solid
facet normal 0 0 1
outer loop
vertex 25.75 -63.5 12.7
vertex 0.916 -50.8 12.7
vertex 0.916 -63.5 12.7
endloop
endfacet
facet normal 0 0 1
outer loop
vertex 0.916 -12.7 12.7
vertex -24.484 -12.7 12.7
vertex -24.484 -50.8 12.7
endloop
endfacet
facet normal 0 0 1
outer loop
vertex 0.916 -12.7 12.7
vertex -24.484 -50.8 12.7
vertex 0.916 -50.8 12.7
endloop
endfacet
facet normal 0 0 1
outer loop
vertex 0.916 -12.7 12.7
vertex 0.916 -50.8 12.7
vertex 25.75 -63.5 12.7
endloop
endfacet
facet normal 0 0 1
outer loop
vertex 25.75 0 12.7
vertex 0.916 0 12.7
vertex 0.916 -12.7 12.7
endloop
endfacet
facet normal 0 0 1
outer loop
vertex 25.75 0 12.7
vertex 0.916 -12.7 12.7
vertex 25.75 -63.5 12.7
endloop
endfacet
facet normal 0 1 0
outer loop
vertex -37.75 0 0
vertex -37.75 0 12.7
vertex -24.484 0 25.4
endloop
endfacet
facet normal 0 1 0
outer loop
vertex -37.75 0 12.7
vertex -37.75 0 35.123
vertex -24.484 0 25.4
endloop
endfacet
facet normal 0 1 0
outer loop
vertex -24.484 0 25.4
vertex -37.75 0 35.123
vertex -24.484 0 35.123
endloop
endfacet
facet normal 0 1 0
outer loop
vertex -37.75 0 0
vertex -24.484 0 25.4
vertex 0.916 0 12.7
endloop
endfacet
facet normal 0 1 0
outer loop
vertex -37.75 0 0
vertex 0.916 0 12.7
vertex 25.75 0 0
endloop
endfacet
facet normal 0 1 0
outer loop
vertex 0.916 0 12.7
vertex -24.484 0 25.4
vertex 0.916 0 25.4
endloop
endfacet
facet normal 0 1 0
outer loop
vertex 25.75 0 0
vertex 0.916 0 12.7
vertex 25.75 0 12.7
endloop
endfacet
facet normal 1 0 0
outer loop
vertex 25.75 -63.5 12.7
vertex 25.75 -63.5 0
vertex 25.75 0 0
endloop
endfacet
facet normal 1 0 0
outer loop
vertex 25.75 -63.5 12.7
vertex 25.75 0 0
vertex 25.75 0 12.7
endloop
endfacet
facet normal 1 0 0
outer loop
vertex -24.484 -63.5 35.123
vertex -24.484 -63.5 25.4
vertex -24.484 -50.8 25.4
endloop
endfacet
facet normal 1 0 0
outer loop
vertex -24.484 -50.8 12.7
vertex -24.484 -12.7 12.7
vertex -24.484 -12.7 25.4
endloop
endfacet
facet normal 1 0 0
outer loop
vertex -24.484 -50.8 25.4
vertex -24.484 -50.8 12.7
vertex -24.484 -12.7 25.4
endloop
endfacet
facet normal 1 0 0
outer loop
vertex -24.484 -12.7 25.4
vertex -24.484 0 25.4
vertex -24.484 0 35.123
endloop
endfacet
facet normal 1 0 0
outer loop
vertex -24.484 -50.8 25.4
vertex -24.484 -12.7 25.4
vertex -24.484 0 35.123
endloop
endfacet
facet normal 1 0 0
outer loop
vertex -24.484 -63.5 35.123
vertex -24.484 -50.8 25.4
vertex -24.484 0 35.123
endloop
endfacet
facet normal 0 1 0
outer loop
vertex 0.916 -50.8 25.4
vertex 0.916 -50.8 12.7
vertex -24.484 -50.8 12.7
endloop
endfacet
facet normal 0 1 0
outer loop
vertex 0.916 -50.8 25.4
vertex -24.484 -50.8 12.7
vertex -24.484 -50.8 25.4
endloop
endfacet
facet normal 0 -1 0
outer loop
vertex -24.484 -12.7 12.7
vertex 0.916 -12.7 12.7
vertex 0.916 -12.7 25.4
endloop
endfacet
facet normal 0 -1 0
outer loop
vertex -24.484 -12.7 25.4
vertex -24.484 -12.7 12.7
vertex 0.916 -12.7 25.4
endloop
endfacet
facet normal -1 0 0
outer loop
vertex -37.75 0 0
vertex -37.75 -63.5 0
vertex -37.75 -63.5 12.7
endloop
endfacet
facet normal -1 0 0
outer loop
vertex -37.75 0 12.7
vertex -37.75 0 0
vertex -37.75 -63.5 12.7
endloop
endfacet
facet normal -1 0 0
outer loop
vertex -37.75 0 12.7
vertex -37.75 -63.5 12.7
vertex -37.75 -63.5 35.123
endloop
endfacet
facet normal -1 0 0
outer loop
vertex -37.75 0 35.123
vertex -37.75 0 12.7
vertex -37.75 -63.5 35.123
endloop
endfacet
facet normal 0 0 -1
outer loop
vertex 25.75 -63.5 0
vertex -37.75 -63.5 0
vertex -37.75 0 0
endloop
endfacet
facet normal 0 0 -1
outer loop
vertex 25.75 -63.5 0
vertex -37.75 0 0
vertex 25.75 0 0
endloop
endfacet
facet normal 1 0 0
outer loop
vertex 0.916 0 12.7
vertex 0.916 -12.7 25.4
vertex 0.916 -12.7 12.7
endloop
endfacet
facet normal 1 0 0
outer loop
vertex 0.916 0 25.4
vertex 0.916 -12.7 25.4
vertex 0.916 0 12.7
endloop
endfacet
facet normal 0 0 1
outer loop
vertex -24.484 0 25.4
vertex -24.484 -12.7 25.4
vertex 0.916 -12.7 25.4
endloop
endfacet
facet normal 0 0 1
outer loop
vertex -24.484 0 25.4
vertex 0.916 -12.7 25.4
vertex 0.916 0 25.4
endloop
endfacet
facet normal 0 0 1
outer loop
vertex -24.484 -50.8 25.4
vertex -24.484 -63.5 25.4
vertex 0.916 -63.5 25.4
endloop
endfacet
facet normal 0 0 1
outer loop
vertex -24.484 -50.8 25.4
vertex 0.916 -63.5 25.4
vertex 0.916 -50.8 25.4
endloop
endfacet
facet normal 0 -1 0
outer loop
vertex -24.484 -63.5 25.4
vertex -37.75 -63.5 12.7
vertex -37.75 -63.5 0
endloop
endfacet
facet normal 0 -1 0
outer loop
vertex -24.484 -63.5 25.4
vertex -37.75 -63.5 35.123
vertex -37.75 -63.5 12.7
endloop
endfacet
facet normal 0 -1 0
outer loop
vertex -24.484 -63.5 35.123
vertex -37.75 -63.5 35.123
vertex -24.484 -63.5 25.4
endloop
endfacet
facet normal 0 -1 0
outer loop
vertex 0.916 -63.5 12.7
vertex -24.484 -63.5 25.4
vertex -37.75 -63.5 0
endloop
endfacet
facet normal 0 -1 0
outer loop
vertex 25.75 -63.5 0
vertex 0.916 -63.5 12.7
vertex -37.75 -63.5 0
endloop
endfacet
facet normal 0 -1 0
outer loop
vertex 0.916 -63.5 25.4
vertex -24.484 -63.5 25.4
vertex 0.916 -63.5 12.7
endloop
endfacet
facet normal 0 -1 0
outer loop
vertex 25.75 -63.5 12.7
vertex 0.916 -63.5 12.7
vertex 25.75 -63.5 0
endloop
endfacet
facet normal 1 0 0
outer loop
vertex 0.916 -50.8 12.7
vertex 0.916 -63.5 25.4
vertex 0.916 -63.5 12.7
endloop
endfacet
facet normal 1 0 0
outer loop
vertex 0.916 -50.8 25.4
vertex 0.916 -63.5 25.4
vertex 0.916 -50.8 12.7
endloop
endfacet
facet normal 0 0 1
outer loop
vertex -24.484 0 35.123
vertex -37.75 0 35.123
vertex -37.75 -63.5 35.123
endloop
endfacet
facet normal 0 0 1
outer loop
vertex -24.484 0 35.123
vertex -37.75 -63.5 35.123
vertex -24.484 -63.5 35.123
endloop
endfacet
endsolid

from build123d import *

# Parameters (mm, degrees)
F0_W     = 63.5
F0_H     = 12.7
F1_DEPTH = 63.5
F2_W     = 13.266523
F2_H     = 22.422786
F3_DEPTH = 63.5
F4_W     = 12.7
F4_H     = 12.7
F5_DEPTH = 25.4
F6_W     = 12.7
F6_H     = 12.7
F7_DEPTH = 25.4


with BuildPart() as f1:
    # F0 (on Front) → F1 (new body)
    with BuildSketch(Plane.XZ):
        with Locations((-6.000457, 6.35)):
            Rectangle(F0_W, F0_H)
    extrude(amount=F1_DEPTH)

    # F2 (on Front) → F3 (join)
    with BuildSketch(Plane.XZ):
        with Locations((-31.117195, 23.911393)):
            Rectangle(F2_W, F2_H)
    extrude(amount=F3_DEPTH)

    # F4 (on face) → F5 (join)
    with BuildSketch(Plane.YZ.offset(-24.483934)):
        with Locations((-57.15, 19.05)):
            Rectangle(F4_W, F4_H)
    extrude(amount=F5_DEPTH)

    # F6 (on face) → F7 (join)
    with BuildSketch(Plane.YZ.offset(-24.483934)):
        with Locations((-6.35, 19.05)):
            Rectangle(F6_W, F6_H)
    extrude(amount=F7_DEPTH)


solid = f1.part
